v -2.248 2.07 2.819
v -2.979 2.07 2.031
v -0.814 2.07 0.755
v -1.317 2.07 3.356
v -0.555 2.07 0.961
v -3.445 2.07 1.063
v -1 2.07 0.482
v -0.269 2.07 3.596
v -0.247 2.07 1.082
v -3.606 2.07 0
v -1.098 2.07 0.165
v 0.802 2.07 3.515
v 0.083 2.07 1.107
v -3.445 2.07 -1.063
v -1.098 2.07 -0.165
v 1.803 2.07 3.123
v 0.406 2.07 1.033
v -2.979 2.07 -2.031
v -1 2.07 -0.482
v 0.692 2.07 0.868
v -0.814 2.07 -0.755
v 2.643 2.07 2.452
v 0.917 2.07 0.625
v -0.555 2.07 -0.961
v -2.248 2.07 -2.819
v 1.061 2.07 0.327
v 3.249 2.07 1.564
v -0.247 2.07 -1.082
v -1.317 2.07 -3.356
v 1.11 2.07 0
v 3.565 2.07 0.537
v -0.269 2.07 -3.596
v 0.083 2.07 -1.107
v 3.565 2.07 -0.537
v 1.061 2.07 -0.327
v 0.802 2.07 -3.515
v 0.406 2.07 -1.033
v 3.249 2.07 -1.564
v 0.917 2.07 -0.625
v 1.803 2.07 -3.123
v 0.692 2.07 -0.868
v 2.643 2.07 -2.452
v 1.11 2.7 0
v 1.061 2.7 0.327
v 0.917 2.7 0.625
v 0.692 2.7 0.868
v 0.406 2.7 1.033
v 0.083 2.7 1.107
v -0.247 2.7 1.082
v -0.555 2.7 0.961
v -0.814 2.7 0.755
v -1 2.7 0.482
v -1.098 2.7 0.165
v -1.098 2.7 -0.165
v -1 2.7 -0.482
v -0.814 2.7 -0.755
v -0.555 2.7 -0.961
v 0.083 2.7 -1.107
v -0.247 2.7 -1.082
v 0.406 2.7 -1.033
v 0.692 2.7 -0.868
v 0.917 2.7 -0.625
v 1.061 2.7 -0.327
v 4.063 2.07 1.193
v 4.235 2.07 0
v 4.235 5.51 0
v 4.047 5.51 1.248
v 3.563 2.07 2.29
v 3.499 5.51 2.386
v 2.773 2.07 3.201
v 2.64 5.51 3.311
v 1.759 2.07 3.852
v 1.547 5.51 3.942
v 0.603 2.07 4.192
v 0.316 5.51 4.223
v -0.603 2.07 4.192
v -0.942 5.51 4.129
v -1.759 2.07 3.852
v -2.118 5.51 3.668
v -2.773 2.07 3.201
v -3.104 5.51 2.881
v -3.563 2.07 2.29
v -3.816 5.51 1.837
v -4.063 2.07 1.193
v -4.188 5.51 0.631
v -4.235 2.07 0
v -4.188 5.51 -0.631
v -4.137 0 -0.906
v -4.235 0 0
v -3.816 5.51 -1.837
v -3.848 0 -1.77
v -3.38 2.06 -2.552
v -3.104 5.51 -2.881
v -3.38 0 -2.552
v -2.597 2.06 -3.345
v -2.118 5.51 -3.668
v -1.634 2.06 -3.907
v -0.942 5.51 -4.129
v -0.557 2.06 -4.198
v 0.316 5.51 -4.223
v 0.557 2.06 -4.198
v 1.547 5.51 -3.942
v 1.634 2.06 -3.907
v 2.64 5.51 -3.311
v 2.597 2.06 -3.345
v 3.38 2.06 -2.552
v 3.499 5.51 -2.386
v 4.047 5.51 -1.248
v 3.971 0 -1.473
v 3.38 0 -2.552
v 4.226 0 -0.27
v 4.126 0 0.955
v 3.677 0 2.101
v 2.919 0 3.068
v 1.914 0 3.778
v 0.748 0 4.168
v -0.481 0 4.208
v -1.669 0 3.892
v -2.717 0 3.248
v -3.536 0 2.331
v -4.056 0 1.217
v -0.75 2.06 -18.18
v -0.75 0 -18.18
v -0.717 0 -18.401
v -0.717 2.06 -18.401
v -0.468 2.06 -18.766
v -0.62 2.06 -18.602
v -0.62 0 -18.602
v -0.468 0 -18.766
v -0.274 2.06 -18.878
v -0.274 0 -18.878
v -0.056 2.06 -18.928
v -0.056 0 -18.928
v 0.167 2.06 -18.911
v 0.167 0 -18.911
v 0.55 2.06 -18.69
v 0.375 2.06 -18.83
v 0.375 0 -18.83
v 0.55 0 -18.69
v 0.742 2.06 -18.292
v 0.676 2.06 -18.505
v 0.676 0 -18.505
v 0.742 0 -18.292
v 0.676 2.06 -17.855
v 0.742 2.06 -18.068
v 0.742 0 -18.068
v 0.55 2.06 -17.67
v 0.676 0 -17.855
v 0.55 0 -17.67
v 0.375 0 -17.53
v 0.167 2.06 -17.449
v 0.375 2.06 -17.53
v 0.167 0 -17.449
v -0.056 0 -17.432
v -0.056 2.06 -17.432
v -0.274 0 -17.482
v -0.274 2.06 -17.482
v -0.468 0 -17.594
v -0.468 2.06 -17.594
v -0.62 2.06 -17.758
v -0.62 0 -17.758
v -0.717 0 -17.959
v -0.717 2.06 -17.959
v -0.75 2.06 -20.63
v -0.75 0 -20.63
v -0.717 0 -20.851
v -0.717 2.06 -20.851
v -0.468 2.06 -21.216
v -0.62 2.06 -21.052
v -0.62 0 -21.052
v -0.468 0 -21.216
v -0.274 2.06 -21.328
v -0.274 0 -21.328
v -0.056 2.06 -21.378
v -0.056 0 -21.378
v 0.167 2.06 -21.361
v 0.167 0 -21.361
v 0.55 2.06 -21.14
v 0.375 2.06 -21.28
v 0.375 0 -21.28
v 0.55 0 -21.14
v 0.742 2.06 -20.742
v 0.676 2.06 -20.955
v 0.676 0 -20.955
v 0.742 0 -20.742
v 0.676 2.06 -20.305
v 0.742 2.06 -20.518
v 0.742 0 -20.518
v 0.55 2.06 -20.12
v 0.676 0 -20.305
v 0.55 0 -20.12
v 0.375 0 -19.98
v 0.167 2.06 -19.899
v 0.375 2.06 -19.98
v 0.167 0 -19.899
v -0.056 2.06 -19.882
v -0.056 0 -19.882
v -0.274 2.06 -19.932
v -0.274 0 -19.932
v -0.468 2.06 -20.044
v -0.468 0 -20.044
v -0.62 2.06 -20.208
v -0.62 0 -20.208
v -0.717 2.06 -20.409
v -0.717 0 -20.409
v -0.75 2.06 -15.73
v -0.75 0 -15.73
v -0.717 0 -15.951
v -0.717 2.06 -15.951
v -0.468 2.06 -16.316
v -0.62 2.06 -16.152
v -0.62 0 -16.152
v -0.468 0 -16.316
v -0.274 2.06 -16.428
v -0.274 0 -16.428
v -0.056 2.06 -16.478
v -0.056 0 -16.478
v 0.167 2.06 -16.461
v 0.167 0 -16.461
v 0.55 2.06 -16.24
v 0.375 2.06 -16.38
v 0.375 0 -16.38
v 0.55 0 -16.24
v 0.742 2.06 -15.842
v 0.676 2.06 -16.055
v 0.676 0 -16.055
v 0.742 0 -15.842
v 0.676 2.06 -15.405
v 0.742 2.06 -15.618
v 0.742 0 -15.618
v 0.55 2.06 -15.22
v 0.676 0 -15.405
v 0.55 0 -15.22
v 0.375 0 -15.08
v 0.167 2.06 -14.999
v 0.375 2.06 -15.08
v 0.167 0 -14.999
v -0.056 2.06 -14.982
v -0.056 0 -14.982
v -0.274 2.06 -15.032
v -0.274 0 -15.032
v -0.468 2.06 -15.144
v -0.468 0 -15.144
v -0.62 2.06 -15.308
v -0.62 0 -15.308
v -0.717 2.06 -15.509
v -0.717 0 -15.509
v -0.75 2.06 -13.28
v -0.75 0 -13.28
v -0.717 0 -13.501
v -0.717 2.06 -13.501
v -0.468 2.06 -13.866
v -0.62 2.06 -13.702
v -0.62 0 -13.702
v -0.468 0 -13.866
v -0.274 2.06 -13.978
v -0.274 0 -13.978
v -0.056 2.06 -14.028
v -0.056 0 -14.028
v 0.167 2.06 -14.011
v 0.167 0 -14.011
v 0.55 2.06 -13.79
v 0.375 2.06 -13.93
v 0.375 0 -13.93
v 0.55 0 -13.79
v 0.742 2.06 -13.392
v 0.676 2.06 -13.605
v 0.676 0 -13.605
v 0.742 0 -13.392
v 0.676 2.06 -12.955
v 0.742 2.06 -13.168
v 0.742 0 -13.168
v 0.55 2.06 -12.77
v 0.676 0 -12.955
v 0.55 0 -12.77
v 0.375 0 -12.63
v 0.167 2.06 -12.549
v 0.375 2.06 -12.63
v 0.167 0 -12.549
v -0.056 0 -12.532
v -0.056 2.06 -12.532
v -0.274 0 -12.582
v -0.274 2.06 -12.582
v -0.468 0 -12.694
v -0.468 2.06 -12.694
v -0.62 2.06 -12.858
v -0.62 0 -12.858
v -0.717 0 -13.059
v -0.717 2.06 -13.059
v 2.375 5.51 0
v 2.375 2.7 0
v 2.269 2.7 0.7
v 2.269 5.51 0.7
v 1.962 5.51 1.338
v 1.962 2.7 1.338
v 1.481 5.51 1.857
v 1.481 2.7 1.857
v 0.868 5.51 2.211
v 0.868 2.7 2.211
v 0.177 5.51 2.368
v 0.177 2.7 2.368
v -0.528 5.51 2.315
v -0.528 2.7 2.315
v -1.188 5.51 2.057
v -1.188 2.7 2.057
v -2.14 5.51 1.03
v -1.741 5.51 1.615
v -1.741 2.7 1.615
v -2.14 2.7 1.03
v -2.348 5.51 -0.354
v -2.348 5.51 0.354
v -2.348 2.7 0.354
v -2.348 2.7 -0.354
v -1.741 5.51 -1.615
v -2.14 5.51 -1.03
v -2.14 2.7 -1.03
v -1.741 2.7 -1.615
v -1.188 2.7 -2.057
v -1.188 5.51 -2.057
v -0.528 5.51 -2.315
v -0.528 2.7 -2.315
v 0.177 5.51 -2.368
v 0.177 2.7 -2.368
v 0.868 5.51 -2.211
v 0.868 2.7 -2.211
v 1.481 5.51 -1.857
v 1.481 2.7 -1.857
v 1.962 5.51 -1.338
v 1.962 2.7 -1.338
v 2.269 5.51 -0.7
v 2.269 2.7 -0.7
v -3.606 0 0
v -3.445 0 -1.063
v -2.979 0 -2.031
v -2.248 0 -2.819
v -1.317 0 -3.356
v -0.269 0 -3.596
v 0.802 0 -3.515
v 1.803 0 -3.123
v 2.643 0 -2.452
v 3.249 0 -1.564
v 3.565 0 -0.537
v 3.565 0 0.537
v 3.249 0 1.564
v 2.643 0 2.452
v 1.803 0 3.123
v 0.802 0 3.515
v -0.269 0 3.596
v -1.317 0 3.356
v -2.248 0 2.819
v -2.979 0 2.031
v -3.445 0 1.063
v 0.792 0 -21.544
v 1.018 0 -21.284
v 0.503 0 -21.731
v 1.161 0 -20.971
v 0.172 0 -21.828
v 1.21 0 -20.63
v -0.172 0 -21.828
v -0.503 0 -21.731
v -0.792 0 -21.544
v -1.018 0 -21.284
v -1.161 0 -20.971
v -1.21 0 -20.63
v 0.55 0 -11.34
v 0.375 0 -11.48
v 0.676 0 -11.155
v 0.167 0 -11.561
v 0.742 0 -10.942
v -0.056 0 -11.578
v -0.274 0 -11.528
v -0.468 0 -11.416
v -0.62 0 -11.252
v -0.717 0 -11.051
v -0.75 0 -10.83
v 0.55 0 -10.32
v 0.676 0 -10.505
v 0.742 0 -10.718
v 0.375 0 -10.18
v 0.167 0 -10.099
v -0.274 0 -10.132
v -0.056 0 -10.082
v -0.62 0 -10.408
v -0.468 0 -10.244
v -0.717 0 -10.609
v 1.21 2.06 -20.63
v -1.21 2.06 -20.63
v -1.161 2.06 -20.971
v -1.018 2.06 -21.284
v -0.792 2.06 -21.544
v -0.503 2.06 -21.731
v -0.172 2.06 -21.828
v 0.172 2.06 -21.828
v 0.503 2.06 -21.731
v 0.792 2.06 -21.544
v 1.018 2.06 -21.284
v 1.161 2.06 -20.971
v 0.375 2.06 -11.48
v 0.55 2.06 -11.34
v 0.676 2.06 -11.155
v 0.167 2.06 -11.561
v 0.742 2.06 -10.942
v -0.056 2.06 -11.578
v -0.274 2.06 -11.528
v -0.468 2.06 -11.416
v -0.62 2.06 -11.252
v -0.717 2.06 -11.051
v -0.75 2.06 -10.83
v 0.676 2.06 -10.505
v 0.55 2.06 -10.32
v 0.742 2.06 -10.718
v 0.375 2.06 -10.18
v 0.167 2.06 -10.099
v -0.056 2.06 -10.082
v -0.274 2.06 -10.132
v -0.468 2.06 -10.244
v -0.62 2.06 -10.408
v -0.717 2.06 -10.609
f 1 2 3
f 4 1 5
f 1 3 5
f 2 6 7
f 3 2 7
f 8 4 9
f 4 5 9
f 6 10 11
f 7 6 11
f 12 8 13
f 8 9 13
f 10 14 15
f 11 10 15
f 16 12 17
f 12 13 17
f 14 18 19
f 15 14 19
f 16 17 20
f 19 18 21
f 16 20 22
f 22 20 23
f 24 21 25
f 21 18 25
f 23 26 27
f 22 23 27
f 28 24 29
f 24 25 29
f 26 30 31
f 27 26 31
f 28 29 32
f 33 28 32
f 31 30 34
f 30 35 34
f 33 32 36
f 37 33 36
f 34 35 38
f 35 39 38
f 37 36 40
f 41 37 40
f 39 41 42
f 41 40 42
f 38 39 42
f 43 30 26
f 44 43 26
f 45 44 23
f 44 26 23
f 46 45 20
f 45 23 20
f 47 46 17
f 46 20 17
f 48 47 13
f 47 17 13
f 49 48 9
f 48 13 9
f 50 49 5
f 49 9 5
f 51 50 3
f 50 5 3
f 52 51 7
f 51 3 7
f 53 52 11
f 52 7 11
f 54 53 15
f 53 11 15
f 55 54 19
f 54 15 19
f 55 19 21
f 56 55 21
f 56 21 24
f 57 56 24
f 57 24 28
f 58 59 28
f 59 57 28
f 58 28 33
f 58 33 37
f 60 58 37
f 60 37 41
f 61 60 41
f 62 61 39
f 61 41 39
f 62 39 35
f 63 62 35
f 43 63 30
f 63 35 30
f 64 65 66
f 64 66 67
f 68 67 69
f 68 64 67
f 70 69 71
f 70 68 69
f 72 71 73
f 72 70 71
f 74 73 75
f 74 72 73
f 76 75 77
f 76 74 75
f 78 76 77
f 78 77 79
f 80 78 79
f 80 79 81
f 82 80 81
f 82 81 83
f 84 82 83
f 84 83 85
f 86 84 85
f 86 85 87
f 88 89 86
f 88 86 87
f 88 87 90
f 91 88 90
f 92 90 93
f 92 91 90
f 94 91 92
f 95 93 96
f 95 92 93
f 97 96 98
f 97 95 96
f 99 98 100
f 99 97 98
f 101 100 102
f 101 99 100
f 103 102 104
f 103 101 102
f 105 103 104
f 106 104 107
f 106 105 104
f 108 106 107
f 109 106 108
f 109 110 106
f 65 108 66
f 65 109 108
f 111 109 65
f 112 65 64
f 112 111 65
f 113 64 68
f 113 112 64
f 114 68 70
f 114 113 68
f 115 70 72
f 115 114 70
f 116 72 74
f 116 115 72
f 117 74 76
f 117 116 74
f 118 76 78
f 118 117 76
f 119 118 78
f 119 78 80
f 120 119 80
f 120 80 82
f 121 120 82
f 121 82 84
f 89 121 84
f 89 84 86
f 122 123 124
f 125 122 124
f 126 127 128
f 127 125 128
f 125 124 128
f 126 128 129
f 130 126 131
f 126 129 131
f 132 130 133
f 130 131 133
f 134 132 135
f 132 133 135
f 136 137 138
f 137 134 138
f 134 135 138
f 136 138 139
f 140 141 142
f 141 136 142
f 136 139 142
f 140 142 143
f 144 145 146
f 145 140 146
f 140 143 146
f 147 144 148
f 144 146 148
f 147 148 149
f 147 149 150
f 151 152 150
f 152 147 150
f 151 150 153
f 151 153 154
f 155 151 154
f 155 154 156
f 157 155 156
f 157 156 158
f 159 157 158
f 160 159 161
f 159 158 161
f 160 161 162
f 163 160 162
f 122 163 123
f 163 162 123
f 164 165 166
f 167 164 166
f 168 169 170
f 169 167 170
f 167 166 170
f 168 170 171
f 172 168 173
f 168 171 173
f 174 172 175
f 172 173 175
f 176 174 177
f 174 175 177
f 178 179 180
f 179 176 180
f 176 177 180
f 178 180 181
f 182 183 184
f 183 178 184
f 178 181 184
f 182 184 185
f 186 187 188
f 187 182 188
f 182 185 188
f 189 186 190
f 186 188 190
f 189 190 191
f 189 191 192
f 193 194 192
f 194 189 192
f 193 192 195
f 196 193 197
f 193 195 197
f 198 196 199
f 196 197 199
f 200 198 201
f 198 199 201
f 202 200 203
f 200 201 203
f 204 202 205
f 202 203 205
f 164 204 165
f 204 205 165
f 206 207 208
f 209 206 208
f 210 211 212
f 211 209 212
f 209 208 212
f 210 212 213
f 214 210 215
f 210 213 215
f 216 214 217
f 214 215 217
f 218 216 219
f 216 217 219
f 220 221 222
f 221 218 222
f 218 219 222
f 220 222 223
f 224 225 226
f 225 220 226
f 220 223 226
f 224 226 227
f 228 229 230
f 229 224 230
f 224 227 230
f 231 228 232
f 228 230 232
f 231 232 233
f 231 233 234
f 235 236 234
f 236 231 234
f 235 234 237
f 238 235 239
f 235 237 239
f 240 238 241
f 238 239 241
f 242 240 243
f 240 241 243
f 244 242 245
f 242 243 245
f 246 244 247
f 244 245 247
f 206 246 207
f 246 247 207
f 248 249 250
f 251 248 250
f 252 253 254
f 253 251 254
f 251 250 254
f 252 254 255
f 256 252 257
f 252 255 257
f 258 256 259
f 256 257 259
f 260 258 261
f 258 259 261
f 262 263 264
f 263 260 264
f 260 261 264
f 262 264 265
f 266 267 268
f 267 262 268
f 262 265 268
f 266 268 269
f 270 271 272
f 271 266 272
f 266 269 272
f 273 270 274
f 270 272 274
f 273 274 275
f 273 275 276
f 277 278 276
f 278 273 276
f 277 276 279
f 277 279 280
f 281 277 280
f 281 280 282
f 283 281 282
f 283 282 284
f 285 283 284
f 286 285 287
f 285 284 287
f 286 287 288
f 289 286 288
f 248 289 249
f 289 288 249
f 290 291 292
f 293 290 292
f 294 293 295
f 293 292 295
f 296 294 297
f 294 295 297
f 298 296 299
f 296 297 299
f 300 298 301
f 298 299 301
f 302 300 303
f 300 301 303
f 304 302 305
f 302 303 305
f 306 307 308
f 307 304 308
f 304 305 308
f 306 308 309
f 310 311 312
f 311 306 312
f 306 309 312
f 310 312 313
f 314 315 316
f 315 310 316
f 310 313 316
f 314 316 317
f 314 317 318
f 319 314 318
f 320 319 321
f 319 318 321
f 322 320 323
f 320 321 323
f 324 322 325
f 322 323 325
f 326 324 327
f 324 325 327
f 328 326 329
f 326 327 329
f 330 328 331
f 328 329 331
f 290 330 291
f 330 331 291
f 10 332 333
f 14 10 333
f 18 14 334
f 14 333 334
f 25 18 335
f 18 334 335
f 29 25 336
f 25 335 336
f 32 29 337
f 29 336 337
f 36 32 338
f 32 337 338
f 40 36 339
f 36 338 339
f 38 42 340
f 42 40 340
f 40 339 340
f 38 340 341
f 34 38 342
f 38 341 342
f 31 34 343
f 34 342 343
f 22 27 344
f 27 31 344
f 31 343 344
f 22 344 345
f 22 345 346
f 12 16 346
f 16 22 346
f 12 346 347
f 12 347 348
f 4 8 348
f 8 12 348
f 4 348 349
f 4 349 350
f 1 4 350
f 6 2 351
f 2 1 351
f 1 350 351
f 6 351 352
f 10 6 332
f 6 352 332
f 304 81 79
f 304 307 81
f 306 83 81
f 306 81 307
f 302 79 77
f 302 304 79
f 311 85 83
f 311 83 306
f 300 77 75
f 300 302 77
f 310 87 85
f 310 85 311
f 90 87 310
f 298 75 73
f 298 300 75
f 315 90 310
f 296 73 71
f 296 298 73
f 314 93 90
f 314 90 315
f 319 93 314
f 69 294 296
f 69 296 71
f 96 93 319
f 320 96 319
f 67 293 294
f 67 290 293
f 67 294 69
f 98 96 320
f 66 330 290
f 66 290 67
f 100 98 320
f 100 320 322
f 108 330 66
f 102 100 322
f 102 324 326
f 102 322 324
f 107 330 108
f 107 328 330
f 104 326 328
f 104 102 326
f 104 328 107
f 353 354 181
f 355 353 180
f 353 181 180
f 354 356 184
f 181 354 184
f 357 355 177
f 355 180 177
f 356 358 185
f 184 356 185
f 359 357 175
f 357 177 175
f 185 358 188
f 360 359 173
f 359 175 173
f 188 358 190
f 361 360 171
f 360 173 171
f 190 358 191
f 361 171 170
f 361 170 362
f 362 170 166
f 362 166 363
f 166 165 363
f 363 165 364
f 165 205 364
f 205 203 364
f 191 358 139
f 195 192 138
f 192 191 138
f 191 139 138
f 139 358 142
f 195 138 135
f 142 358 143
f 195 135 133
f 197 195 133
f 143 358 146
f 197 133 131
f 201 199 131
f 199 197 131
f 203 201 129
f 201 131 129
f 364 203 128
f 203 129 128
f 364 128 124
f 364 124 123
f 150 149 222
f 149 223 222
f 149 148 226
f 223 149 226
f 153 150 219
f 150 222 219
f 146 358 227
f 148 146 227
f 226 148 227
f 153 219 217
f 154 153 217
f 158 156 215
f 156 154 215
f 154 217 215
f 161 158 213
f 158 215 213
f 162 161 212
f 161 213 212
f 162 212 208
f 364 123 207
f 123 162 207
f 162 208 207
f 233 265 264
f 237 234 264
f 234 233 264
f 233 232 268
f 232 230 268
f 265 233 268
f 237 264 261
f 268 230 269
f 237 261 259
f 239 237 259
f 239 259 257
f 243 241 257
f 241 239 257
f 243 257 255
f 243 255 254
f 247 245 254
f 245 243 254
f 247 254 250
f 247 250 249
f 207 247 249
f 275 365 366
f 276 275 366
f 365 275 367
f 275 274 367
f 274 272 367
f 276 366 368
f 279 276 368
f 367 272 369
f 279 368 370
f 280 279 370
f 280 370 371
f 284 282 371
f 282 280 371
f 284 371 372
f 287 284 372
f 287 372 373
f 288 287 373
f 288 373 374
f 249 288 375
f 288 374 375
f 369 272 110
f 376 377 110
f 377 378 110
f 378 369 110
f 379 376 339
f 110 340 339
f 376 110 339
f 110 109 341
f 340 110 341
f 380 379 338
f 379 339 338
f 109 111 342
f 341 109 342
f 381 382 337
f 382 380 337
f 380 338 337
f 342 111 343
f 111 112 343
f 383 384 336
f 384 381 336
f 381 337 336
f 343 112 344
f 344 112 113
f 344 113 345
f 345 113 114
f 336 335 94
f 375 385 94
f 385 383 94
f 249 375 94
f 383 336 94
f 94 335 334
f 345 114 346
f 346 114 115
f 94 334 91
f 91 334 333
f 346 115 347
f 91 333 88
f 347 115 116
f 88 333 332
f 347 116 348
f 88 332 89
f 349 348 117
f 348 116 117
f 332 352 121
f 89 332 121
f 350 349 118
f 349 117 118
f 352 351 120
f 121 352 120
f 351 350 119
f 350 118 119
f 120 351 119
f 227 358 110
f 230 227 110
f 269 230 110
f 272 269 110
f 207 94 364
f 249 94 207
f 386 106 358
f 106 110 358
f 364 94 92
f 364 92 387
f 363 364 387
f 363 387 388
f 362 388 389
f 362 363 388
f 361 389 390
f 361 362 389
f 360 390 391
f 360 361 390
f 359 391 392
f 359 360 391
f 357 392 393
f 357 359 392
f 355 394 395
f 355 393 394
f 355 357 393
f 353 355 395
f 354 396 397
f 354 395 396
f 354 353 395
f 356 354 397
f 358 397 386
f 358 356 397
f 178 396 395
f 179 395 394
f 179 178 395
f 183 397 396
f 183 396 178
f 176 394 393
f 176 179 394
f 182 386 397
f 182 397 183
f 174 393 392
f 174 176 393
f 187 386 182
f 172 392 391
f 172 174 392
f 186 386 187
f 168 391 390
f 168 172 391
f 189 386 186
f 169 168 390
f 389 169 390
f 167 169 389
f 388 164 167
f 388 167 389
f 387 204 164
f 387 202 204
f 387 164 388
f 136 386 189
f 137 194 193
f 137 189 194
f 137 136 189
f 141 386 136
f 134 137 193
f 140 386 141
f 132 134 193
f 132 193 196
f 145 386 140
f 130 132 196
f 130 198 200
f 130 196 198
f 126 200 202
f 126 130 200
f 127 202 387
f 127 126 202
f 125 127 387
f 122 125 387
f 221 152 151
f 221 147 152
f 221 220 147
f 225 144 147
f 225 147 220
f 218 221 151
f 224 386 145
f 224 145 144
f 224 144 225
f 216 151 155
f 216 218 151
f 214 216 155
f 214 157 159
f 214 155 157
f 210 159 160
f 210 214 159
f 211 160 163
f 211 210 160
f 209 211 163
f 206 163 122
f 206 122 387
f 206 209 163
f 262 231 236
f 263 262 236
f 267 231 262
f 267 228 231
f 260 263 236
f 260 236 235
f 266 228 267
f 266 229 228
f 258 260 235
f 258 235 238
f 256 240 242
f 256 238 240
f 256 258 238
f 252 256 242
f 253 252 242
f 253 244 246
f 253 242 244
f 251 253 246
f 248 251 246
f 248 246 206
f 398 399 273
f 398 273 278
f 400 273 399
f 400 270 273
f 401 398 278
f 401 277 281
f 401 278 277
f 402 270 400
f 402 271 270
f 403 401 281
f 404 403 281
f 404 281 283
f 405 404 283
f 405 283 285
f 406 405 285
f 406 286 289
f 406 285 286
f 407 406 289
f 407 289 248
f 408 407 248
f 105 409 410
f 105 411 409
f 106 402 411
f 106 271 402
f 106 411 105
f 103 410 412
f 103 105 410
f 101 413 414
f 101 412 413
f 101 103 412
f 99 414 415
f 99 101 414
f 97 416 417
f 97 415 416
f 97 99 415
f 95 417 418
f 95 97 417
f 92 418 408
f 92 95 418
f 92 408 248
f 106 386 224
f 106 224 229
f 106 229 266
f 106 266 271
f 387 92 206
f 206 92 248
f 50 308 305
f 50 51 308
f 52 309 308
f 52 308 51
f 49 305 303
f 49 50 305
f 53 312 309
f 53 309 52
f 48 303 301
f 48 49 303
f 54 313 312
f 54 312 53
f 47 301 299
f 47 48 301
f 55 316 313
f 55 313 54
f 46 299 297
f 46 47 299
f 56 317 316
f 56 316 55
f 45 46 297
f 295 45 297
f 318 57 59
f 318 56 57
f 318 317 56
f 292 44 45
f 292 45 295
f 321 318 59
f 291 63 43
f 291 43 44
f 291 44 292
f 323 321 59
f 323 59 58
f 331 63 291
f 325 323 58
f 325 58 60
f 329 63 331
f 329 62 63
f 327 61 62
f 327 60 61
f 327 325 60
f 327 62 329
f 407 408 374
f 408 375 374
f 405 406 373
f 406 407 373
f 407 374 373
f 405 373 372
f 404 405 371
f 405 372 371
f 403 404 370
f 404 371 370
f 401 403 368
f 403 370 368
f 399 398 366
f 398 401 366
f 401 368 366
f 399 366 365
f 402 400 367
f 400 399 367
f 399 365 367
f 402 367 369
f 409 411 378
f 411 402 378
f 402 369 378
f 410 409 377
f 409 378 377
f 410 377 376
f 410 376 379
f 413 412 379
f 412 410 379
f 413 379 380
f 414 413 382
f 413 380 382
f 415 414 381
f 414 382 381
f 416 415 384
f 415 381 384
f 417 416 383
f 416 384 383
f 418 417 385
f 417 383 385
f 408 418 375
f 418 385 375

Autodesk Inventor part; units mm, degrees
ref_plane "YZ Plane" through (0, 0, 0) normal (1, 0, 0) x (0, 1, 0)
ref_plane "XZ Plane" through (0, 0, 0) normal (0, 1, 0) x (-1, 0, 0)
ref_plane "XY Plane" through (0, 0, 0) normal (0, 0, 1) x (1, 0, 0)
sketch "Sketch1" plane through (0, 0, 0) normal (0, 1, 0) x (-1, 0, 0)
  circle A0 centre (0, 0) radius 4.235
  circle A1 centre (0, 0) radius 2.375
  circle A2 centre (0, 0) radius 1.11
  circle A3 centre (0, 0) radius 3.6056
  arc A4 (-1.21, -20.63) -> (1.21, -20.63) centre (0, -20.63) ccw
  line L0 (-3.38, -2.5516) -> (-1.21, -20.63)
  line L1 (3.38, -2.5516) -> (1.21, -20.63)
  circle A5 centre (0, -20.63) radius 0.75
  circle A6 centre (0, -18.18) radius 0.75
  circle A7 centre (0, -10.83) radius 0.75
  circle A8 centre (0, -13.28) radius 0.75
  circle A9 centre (0, -15.73) radius 0.75
  point P0 (0, -2.5516)
  dimension "d2" = 2.22
  dimension "d3" = 0.6294
  dimension "d14" = 1.5
  dimension "d15" = 0.46
  dimension "d16" = 1.5
  dimension "d17" = 0.95
  dimension "d18" = 1.5
  dimension "d19" = 1.5
  dimension "d20" = 1.5
  dimension "d21" = 0.95
  dimension "d22" = 0.95
  dimension "d23" = 0.95
  dimension "d26" = 4.75
extrude "Extrusion1" add sketch "Sketch1" along normal blind 2.07 contours A0
sketch "Sketch2" plane through (0, 2.07, 0) normal (0, 1, 0) x (1, 0, 0)
  circle A0 centre (0, 0) radius 3.6056 projected
  circle A1 centre (0, 0) radius 2.375 projected
  circle A2 centre (0, 0) radius 3.6056 projected
  circle A3 centre (0, 0) radius 4.235 projected
  circle A4 centre (0, 0) radius 1.11 projected
extrude "Extrusion2" add sketch "Sketch2" along normal blind 0.63 contours A0 | A1 | A3
sketch "Sketch3" plane through (0, 2.7, 0) normal (0, 1, 0) x (1, 0, 0)
  circle A0 centre (0, 0) radius 2.375 projected
  circle A1 centre (0, 0) radius 3.6056 projected
  circle A2 centre (0, 0) radius 4.235 projected
  circle A3 centre (0, 0) radius 1.11 projected
extrude "Extrusion3" add sketch "Sketch3" along normal blind 2.81 contours A1 | A2
extrude "Extrusion4" add sketch "Sketch1" along normal blind 2.06 contours A0 L1 A4 L0
properties part number "hornminiservo"
